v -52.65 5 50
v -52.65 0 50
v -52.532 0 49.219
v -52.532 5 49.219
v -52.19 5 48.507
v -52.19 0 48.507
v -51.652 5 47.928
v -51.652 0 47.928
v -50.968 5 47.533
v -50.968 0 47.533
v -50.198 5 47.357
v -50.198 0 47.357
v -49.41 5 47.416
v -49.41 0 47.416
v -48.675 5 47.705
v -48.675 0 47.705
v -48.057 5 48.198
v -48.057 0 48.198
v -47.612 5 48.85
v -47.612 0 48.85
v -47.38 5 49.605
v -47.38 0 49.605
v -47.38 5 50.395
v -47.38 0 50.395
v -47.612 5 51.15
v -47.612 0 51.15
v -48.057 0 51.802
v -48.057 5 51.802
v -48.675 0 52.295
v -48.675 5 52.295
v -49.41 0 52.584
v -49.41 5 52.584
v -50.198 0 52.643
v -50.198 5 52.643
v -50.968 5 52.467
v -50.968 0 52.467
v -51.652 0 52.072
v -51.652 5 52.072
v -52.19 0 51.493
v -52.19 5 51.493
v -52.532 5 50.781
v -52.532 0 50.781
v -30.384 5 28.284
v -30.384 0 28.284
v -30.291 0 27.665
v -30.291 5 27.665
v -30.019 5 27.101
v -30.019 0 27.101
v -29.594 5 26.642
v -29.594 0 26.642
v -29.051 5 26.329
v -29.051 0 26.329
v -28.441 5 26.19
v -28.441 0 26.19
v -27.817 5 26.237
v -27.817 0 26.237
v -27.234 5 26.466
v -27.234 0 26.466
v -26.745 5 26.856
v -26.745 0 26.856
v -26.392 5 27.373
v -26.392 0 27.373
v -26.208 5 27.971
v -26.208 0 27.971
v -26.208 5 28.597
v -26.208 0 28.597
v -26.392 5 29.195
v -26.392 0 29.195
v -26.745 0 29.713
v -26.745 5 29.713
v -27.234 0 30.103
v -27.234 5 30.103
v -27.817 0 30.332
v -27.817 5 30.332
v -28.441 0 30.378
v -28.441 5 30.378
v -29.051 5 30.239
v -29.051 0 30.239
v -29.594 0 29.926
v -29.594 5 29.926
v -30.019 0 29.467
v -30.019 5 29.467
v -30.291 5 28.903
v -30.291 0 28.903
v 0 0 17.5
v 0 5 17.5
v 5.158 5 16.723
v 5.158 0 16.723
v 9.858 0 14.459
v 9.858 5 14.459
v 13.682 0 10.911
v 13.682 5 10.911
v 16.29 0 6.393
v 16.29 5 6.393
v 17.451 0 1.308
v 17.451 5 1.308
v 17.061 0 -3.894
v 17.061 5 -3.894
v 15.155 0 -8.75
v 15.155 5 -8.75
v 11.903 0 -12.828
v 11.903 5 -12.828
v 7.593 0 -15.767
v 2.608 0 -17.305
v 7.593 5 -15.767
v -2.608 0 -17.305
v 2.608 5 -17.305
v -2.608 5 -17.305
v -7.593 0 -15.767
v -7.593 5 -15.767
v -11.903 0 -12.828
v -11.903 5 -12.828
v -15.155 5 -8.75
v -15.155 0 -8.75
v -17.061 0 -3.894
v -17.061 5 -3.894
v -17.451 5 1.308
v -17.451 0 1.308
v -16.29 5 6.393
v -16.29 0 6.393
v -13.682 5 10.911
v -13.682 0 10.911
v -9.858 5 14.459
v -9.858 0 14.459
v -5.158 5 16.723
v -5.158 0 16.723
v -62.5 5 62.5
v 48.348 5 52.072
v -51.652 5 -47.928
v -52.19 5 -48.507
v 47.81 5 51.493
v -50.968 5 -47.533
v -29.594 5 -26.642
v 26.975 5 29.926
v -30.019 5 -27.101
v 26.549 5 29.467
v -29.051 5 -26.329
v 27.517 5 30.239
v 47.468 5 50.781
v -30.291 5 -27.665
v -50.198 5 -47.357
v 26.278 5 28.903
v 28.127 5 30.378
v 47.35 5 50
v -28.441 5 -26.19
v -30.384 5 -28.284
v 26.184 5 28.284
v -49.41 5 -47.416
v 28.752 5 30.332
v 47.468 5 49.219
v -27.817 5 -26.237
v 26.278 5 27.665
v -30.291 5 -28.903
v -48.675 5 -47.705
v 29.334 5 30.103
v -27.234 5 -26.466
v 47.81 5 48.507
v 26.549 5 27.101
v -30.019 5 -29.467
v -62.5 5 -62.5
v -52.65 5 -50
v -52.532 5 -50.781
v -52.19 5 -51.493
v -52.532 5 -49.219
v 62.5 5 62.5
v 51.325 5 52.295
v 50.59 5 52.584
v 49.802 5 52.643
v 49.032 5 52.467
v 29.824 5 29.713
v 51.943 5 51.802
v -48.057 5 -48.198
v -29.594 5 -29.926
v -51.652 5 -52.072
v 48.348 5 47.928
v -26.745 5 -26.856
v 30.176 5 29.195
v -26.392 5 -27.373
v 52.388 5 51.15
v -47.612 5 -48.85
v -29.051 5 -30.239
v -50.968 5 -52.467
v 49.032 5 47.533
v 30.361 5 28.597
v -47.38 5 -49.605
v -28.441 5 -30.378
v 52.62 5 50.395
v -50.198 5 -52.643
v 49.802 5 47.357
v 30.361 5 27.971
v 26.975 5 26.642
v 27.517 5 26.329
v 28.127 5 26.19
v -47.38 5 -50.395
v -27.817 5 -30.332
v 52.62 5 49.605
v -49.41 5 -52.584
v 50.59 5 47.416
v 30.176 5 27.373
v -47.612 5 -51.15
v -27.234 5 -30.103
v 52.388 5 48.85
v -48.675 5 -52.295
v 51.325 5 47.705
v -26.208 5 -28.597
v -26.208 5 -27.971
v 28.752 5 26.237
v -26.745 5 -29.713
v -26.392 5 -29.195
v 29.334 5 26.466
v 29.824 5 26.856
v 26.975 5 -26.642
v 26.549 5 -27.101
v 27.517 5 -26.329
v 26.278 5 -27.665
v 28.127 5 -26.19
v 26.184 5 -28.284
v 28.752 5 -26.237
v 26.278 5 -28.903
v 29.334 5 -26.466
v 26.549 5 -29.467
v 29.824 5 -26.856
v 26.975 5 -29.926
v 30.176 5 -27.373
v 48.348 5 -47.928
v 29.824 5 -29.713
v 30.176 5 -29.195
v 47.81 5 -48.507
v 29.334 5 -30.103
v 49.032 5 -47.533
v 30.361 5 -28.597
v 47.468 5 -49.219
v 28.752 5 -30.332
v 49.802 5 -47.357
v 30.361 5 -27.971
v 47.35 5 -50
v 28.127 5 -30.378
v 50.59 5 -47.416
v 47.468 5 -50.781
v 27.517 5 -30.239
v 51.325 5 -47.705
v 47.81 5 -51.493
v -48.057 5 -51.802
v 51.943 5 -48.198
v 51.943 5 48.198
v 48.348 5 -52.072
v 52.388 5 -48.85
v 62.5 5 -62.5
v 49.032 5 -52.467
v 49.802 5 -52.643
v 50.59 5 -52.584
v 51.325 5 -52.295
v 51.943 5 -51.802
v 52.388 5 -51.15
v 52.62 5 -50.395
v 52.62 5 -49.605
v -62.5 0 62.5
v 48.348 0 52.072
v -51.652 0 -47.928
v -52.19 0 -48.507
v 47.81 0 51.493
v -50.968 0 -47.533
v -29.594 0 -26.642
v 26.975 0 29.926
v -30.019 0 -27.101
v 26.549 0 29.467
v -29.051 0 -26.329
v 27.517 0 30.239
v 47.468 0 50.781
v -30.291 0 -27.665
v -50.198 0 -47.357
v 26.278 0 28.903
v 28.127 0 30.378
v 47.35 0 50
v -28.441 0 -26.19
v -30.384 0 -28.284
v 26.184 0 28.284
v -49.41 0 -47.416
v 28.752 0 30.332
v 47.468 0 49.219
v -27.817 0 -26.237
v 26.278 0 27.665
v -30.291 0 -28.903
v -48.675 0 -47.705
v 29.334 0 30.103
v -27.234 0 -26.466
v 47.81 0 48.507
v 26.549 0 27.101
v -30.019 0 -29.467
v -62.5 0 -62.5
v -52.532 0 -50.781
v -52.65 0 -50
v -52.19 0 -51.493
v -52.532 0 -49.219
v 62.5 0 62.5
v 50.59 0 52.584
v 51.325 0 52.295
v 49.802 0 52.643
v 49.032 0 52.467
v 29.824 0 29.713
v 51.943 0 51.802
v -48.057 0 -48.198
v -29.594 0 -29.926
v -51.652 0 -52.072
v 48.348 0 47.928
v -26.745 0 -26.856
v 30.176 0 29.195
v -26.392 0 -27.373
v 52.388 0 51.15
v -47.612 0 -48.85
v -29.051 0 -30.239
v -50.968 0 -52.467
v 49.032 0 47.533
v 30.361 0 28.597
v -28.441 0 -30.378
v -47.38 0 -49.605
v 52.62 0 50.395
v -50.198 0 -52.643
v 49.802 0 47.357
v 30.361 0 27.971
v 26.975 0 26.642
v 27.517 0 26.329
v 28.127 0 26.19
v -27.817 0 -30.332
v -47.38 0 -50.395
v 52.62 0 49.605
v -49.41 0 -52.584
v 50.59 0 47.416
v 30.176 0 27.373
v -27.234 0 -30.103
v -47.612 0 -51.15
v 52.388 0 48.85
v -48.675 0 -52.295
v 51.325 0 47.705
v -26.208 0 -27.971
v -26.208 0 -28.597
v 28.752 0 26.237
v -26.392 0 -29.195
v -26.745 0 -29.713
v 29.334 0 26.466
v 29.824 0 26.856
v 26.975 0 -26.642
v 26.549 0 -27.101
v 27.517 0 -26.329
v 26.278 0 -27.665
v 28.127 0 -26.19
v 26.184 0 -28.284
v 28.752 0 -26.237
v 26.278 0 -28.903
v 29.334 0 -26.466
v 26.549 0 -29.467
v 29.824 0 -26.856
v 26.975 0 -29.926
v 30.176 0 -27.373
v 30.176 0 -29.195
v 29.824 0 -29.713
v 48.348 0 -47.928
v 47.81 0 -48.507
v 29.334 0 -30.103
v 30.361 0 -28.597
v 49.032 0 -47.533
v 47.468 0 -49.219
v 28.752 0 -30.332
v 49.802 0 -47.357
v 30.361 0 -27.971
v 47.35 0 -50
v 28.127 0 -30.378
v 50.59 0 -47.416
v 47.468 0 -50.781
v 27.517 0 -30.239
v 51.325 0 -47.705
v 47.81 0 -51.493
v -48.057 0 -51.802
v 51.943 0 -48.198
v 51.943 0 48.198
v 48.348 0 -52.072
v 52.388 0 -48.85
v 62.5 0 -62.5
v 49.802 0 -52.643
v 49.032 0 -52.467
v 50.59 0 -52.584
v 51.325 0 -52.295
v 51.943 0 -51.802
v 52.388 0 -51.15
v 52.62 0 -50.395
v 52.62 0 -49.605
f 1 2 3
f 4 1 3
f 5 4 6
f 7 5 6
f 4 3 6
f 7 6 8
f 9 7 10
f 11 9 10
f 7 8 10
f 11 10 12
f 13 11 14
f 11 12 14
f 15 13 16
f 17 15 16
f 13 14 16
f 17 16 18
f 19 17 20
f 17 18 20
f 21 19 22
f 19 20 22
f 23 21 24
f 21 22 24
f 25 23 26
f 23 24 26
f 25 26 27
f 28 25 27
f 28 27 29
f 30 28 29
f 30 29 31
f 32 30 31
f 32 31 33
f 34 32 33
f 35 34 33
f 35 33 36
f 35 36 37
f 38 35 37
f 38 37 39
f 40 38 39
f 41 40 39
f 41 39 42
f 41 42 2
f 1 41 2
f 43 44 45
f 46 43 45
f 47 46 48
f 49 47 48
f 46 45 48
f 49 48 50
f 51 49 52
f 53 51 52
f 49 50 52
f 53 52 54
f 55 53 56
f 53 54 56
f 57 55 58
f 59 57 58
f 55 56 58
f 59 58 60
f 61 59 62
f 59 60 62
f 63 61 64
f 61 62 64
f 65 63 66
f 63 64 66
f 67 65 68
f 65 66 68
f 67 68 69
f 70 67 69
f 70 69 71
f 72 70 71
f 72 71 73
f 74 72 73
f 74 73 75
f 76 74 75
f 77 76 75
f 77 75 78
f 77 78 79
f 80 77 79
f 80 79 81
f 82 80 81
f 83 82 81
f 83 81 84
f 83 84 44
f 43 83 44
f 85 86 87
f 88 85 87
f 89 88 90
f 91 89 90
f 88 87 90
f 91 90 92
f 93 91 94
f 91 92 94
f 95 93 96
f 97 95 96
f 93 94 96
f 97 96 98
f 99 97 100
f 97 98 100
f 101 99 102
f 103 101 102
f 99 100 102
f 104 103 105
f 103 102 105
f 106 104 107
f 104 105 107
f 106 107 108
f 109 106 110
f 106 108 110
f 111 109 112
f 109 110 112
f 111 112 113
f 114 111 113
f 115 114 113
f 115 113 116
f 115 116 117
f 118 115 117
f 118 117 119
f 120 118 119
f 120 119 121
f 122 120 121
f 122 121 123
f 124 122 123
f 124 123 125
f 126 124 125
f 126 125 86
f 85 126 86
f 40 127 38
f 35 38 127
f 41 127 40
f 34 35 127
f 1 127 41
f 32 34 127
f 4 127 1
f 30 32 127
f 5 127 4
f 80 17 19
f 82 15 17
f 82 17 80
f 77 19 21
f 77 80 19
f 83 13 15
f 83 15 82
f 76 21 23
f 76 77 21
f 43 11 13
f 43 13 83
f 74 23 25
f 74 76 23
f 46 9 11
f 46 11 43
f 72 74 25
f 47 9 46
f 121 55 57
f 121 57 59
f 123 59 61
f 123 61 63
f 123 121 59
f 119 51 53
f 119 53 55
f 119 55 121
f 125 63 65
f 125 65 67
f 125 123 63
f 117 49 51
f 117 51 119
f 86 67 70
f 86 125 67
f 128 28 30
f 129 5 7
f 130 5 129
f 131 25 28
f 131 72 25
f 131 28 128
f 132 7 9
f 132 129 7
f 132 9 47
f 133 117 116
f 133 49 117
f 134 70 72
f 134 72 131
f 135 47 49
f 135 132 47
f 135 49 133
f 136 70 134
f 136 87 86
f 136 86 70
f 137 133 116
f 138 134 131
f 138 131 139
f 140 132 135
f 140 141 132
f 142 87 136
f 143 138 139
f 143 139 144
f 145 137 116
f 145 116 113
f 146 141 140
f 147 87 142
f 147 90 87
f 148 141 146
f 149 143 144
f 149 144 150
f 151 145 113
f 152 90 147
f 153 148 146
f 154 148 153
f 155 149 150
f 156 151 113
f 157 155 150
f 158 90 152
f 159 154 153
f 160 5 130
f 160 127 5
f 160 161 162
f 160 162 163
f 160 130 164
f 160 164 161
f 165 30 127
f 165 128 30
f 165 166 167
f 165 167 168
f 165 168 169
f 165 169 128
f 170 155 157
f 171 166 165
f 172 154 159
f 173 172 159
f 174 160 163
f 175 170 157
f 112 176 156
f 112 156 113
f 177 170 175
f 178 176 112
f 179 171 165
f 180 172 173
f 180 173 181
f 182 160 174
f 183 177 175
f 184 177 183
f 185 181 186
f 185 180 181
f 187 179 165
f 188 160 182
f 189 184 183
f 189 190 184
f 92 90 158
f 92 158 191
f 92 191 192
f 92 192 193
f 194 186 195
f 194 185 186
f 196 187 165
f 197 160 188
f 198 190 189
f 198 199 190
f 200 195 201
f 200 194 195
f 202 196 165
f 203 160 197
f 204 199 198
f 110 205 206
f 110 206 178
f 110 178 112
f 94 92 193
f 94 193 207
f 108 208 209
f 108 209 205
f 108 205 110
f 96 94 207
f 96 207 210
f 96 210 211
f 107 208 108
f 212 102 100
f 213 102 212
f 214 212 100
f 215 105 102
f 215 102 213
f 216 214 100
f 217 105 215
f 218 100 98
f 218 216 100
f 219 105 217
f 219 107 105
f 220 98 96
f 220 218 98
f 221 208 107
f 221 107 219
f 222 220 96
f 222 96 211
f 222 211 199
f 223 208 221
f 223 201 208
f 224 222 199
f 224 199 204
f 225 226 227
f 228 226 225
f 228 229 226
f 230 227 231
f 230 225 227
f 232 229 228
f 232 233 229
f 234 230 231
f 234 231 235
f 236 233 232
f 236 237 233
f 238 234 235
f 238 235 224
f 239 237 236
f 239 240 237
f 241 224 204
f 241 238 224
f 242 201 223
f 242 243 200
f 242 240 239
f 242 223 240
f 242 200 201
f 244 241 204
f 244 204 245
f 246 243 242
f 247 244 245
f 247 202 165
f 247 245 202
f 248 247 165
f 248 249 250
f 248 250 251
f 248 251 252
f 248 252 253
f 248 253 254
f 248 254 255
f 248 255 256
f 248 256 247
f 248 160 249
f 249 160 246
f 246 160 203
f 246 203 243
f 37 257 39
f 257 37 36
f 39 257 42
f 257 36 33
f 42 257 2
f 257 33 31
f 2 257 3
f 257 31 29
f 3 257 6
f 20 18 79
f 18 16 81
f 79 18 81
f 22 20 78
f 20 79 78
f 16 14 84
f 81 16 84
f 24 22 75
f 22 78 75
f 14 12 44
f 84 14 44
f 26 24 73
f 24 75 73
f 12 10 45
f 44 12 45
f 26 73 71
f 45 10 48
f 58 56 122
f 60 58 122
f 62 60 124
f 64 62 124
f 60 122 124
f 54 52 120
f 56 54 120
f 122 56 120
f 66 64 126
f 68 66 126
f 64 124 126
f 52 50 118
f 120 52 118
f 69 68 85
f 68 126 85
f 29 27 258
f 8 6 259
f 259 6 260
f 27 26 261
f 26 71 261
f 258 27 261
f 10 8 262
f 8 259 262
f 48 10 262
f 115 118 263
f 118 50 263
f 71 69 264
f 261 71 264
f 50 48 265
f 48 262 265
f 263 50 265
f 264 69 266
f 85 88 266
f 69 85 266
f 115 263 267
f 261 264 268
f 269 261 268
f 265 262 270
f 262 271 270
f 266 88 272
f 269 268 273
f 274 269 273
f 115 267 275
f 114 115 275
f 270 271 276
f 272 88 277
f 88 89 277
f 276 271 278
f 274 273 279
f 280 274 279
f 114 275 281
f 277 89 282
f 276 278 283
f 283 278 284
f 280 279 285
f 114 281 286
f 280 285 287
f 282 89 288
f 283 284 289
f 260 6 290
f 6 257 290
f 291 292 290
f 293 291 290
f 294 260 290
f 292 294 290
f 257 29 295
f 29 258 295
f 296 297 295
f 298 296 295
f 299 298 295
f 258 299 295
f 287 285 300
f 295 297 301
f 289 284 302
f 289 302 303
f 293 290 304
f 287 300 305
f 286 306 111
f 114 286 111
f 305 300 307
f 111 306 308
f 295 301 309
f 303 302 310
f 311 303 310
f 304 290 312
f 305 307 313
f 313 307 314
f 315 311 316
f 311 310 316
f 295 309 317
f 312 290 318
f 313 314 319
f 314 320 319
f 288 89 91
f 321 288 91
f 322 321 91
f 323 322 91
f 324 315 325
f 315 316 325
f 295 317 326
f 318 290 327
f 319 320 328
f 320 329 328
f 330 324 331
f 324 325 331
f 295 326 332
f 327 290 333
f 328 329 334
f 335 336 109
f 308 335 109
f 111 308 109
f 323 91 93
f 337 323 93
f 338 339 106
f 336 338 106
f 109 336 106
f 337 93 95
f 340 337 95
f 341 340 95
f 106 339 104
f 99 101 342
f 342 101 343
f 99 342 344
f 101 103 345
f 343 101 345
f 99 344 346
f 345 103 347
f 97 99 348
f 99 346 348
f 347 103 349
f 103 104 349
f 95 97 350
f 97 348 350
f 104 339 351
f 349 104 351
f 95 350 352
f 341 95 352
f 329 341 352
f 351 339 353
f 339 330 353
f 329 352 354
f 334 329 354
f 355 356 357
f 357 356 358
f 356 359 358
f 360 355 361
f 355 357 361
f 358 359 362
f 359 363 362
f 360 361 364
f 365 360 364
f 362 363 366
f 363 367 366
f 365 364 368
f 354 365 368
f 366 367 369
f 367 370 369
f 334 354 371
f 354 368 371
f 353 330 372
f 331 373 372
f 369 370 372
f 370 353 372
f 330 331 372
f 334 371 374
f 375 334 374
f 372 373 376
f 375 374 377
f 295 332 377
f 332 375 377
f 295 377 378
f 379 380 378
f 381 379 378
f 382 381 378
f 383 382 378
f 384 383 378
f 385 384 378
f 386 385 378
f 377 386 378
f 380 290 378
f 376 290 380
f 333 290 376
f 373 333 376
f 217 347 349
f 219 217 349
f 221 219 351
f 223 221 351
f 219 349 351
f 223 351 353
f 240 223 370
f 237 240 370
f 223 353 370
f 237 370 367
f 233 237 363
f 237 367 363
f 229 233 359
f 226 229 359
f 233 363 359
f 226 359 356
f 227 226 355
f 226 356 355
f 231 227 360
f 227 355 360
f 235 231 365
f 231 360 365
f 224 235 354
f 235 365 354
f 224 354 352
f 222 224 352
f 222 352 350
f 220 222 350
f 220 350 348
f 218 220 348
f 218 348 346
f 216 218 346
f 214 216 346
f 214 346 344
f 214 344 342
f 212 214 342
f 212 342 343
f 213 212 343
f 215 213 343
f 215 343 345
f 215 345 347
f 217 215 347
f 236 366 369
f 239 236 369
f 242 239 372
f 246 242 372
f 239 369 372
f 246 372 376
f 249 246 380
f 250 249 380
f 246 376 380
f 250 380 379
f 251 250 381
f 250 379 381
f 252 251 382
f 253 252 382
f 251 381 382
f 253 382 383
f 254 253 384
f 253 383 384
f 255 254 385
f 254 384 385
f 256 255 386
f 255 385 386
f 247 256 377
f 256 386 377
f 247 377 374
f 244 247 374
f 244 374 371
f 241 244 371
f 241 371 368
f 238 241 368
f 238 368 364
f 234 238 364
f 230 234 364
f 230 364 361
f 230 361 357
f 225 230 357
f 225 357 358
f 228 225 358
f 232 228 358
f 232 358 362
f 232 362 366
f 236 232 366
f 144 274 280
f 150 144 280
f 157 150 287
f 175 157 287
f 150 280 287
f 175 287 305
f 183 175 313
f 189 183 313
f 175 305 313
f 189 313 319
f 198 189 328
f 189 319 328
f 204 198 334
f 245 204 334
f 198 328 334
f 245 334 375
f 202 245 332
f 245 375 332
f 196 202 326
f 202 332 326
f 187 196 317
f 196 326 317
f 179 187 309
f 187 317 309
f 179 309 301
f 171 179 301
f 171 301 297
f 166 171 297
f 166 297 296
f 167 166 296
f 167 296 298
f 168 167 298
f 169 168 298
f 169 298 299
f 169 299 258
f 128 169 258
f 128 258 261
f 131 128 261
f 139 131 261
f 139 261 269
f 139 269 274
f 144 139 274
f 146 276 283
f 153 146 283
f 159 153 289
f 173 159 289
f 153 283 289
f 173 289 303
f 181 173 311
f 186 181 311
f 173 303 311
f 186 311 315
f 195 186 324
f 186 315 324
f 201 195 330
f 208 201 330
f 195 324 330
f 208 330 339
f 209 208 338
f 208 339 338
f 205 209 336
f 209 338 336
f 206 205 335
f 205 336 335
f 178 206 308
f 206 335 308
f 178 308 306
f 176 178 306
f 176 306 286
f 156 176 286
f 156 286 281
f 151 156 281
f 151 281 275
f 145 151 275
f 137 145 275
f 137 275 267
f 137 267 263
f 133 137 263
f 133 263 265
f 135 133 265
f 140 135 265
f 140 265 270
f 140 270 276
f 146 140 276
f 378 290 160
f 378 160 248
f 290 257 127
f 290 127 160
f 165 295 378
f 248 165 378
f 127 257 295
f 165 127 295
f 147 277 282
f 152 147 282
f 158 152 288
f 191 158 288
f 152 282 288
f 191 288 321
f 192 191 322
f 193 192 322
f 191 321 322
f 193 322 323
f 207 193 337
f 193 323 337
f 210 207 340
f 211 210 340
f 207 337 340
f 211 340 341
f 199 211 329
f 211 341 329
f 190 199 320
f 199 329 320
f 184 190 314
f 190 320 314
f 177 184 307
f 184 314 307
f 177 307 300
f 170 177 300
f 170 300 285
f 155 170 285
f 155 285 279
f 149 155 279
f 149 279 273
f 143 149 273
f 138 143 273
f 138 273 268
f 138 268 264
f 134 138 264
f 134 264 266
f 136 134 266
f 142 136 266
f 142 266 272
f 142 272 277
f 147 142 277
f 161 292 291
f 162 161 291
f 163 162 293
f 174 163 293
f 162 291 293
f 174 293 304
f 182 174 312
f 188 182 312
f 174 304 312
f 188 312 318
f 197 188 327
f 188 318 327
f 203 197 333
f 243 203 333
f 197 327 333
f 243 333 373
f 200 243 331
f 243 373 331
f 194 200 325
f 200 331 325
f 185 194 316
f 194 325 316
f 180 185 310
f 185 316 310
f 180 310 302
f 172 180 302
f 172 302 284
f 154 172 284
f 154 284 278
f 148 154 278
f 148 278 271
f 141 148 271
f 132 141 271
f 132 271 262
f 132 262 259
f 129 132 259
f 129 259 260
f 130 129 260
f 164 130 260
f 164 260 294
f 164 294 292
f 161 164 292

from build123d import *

# Parameters (mm, degrees)
ESBO_O1_W                               = 125
ESBO_O1_H                               = 125
RESSALTO_EXTRUS_O1_DEPTH                = 5
ESBO_O2_R                               = 17.5
CORTE_EXTRUS_O1_DEPTH                   = 89.529656048
BROCA_DE_ROSQUEAR_PARA_TARRAXA_DE_M51_D = 4.2
FURO_COM_FOLGA_DE_M51_D                 = 5.3


with BuildPart() as part:
    # Esboço1 → Ressalto-extrusão1 (new body)
    with BuildSketch(Plane(origin=(0, 0, 0), x_dir=(1, 0, 0), z_dir=(0, 1, 0))):
        Rectangle(ESBO_O1_W, ESBO_O1_H)
    extrude(amount=RESSALTO_EXTRUS_O1_DEPTH)

    # Esboço2 → Corte-extrusão1 (cut, through all)
    with BuildSketch(Plane(origin=(0, 5, 0), x_dir=(1, 0, 0), z_dir=(0, 1, 0))):
        with Locations(Location((0, 0, 0), (0, 0, 270))):
            Circle(ESBO_O2_R)
    extrude(amount=-CORTE_EXTRUS_O1_DEPTH, mode=Mode.SUBTRACT)

    # Broca de rosquear para tarraxa de M51 (through all)
    with Locations(Plane(origin=(0, 5, 0), x_dir=(1, 0, 0), z_dir=(0, 1, 0))):
        with Locations((28.284271247, 28.284271247), (28.284271247, -28.284271247), (-28.284271247, -28.284271247), (-28.284271247, 28.284271247)):
            Hole(BROCA_DE_ROSQUEAR_PARA_TARRAXA_DE_M51_D / 2)

    # Furo com folga de M51 (through all)
    with Locations(Plane(origin=(0, 5, 0), x_dir=(1, 0, 0), z_dir=(0, 1, 0))):
        with Locations((-50, -50), (-50, 50), (50, 50), (50, -50)):
            Hole(FURO_COM_FOLGA_DE_M51_D / 2)


solid = part.part
